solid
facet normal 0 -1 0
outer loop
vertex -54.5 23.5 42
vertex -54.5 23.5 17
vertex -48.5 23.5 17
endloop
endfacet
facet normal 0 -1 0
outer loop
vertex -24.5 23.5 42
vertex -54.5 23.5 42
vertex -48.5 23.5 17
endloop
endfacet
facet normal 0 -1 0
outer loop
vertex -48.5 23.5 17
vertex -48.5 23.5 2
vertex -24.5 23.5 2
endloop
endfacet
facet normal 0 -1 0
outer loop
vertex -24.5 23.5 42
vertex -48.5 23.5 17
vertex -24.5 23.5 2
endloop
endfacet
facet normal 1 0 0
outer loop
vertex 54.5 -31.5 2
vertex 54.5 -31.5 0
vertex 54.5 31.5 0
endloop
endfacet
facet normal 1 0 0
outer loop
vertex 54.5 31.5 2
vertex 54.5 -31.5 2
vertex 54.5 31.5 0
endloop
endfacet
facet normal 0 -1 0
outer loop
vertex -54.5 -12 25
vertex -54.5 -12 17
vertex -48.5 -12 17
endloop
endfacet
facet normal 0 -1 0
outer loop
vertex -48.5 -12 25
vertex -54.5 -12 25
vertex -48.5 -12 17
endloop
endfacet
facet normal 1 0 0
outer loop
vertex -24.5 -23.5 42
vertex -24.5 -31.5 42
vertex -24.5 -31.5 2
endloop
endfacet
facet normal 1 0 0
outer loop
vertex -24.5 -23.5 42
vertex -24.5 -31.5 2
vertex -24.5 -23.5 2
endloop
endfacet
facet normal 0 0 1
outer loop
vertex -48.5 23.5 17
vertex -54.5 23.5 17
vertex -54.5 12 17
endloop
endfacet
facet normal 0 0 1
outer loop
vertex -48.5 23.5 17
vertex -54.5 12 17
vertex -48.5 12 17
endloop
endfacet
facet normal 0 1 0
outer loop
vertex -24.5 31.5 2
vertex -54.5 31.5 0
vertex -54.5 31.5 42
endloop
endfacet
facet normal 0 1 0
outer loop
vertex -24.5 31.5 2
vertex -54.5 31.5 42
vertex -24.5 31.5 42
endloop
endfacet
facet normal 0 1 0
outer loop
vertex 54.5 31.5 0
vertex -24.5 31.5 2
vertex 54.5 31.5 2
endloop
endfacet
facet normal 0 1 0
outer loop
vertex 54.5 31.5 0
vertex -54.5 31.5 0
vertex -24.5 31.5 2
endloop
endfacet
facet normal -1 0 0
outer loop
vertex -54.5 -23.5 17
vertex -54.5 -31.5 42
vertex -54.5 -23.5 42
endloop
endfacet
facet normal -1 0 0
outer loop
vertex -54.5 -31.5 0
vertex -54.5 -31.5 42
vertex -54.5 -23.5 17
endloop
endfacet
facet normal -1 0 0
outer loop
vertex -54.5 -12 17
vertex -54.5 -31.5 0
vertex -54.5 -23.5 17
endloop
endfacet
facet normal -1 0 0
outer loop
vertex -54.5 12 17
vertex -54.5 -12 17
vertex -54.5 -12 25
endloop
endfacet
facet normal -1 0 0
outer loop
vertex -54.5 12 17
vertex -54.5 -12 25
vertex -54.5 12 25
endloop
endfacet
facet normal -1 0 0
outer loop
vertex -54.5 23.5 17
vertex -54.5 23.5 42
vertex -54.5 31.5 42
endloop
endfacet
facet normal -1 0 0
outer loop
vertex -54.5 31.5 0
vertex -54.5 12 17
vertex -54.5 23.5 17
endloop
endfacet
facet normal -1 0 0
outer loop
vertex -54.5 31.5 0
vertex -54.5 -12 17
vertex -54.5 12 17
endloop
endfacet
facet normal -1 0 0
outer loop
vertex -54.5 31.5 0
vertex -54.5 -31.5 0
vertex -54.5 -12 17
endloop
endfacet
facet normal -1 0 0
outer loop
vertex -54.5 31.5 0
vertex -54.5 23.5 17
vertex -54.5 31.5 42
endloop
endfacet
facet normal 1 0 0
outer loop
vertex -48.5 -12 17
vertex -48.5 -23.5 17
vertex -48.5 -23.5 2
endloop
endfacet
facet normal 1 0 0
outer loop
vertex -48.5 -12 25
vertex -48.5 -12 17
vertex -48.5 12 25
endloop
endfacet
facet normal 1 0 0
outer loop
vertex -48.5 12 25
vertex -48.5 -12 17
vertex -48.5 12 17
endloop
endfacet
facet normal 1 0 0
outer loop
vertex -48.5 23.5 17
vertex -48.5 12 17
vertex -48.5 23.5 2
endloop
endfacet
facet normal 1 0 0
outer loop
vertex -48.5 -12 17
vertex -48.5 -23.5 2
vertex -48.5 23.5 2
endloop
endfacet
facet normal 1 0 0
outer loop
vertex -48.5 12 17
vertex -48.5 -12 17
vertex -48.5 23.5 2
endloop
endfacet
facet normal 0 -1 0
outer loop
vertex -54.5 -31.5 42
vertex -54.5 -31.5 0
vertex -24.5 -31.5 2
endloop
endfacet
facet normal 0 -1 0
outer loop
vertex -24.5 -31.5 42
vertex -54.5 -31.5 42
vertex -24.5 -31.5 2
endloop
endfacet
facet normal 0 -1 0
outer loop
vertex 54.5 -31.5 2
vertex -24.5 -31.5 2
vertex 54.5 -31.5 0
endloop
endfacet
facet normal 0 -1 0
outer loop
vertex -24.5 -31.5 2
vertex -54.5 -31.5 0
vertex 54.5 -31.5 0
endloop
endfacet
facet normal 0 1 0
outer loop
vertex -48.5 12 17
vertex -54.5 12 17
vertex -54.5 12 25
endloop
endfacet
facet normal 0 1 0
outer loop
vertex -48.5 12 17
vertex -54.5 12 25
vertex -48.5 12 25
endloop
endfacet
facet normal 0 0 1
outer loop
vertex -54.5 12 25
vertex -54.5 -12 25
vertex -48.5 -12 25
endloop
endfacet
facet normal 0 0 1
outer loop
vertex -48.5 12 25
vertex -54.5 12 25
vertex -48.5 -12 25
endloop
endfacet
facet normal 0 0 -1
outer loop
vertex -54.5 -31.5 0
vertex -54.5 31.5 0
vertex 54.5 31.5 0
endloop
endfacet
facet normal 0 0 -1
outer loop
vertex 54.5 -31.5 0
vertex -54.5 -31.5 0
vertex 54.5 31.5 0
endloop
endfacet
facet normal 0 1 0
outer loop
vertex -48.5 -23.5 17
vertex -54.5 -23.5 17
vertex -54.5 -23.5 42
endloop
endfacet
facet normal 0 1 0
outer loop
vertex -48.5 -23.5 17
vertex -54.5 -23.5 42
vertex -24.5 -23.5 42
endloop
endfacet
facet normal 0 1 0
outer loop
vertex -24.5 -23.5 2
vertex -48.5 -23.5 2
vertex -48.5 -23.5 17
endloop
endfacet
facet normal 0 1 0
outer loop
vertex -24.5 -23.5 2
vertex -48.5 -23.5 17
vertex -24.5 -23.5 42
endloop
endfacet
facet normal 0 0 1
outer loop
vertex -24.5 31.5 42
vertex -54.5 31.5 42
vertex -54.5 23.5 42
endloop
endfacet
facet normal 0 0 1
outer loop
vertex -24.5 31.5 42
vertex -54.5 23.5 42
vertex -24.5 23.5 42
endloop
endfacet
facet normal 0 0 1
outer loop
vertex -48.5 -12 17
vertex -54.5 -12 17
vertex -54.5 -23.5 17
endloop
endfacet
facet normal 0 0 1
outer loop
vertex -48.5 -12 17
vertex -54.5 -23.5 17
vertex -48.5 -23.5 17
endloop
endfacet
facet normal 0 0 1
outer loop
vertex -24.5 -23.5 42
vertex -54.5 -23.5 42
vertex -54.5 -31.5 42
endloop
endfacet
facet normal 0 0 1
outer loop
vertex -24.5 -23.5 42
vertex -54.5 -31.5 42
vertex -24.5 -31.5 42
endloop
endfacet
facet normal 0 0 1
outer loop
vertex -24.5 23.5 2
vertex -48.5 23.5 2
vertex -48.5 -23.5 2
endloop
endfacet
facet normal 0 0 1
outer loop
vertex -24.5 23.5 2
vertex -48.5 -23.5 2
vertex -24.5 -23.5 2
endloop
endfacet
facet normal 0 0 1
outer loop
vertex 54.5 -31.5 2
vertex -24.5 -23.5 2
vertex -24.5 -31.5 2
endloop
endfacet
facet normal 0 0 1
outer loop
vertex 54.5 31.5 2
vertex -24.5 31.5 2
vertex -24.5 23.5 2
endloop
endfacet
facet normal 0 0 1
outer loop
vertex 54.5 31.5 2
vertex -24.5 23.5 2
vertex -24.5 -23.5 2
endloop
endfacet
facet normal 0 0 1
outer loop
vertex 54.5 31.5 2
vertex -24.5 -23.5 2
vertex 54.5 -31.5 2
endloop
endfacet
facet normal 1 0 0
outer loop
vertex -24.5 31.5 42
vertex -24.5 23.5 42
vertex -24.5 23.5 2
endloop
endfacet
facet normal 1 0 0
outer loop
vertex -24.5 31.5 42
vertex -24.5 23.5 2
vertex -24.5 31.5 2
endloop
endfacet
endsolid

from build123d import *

# Parameters (mm, degrees)
SKETCH_W     = 109
SKETCH_H     = 63
PAD_DEPTH    = 2
SKETCH001_W  = 30
SKETCH001_H  = 8
PAD001_DEPTH = 40
SKETCH002_W  = 6
SKETCH002_H  = 47
PAD002_DEPTH = 15
SKETCH003_W  = 6
SKETCH003_H  = 24
PAD003_DEPTH = 8


with BuildPart() as part:
    # Sketch → Pad (new body)
    with BuildSketch(Plane.XY):
        Rectangle(SKETCH_W, SKETCH_H)
    extrude(amount=PAD_DEPTH)

    # Sketch001 → Pad001 (new body)
    with BuildSketch(Plane.XY.offset(2)):
        with Locations((-39.5, 27.5)):
            Rectangle(SKETCH001_W, SKETCH001_H)
        with Locations((-39.5, -27.5)):
            Rectangle(SKETCH001_W, SKETCH001_H)
    extrude(amount=PAD001_DEPTH)

    # Sketch002 → Pad002 (new body)
    with BuildSketch(Plane.XY.offset(2)):
        with Locations((-51.5, 0)):
            Rectangle(SKETCH002_W, SKETCH002_H)
    extrude(amount=PAD002_DEPTH)

    # Sketch003 → Pad003 (new body)
    with BuildSketch(Plane.XY.offset(17)):
        with Locations((-51.5, 0)):
            Rectangle(SKETCH003_W, SKETCH003_H)
    extrude(amount=PAD003_DEPTH)


solid = part.part
